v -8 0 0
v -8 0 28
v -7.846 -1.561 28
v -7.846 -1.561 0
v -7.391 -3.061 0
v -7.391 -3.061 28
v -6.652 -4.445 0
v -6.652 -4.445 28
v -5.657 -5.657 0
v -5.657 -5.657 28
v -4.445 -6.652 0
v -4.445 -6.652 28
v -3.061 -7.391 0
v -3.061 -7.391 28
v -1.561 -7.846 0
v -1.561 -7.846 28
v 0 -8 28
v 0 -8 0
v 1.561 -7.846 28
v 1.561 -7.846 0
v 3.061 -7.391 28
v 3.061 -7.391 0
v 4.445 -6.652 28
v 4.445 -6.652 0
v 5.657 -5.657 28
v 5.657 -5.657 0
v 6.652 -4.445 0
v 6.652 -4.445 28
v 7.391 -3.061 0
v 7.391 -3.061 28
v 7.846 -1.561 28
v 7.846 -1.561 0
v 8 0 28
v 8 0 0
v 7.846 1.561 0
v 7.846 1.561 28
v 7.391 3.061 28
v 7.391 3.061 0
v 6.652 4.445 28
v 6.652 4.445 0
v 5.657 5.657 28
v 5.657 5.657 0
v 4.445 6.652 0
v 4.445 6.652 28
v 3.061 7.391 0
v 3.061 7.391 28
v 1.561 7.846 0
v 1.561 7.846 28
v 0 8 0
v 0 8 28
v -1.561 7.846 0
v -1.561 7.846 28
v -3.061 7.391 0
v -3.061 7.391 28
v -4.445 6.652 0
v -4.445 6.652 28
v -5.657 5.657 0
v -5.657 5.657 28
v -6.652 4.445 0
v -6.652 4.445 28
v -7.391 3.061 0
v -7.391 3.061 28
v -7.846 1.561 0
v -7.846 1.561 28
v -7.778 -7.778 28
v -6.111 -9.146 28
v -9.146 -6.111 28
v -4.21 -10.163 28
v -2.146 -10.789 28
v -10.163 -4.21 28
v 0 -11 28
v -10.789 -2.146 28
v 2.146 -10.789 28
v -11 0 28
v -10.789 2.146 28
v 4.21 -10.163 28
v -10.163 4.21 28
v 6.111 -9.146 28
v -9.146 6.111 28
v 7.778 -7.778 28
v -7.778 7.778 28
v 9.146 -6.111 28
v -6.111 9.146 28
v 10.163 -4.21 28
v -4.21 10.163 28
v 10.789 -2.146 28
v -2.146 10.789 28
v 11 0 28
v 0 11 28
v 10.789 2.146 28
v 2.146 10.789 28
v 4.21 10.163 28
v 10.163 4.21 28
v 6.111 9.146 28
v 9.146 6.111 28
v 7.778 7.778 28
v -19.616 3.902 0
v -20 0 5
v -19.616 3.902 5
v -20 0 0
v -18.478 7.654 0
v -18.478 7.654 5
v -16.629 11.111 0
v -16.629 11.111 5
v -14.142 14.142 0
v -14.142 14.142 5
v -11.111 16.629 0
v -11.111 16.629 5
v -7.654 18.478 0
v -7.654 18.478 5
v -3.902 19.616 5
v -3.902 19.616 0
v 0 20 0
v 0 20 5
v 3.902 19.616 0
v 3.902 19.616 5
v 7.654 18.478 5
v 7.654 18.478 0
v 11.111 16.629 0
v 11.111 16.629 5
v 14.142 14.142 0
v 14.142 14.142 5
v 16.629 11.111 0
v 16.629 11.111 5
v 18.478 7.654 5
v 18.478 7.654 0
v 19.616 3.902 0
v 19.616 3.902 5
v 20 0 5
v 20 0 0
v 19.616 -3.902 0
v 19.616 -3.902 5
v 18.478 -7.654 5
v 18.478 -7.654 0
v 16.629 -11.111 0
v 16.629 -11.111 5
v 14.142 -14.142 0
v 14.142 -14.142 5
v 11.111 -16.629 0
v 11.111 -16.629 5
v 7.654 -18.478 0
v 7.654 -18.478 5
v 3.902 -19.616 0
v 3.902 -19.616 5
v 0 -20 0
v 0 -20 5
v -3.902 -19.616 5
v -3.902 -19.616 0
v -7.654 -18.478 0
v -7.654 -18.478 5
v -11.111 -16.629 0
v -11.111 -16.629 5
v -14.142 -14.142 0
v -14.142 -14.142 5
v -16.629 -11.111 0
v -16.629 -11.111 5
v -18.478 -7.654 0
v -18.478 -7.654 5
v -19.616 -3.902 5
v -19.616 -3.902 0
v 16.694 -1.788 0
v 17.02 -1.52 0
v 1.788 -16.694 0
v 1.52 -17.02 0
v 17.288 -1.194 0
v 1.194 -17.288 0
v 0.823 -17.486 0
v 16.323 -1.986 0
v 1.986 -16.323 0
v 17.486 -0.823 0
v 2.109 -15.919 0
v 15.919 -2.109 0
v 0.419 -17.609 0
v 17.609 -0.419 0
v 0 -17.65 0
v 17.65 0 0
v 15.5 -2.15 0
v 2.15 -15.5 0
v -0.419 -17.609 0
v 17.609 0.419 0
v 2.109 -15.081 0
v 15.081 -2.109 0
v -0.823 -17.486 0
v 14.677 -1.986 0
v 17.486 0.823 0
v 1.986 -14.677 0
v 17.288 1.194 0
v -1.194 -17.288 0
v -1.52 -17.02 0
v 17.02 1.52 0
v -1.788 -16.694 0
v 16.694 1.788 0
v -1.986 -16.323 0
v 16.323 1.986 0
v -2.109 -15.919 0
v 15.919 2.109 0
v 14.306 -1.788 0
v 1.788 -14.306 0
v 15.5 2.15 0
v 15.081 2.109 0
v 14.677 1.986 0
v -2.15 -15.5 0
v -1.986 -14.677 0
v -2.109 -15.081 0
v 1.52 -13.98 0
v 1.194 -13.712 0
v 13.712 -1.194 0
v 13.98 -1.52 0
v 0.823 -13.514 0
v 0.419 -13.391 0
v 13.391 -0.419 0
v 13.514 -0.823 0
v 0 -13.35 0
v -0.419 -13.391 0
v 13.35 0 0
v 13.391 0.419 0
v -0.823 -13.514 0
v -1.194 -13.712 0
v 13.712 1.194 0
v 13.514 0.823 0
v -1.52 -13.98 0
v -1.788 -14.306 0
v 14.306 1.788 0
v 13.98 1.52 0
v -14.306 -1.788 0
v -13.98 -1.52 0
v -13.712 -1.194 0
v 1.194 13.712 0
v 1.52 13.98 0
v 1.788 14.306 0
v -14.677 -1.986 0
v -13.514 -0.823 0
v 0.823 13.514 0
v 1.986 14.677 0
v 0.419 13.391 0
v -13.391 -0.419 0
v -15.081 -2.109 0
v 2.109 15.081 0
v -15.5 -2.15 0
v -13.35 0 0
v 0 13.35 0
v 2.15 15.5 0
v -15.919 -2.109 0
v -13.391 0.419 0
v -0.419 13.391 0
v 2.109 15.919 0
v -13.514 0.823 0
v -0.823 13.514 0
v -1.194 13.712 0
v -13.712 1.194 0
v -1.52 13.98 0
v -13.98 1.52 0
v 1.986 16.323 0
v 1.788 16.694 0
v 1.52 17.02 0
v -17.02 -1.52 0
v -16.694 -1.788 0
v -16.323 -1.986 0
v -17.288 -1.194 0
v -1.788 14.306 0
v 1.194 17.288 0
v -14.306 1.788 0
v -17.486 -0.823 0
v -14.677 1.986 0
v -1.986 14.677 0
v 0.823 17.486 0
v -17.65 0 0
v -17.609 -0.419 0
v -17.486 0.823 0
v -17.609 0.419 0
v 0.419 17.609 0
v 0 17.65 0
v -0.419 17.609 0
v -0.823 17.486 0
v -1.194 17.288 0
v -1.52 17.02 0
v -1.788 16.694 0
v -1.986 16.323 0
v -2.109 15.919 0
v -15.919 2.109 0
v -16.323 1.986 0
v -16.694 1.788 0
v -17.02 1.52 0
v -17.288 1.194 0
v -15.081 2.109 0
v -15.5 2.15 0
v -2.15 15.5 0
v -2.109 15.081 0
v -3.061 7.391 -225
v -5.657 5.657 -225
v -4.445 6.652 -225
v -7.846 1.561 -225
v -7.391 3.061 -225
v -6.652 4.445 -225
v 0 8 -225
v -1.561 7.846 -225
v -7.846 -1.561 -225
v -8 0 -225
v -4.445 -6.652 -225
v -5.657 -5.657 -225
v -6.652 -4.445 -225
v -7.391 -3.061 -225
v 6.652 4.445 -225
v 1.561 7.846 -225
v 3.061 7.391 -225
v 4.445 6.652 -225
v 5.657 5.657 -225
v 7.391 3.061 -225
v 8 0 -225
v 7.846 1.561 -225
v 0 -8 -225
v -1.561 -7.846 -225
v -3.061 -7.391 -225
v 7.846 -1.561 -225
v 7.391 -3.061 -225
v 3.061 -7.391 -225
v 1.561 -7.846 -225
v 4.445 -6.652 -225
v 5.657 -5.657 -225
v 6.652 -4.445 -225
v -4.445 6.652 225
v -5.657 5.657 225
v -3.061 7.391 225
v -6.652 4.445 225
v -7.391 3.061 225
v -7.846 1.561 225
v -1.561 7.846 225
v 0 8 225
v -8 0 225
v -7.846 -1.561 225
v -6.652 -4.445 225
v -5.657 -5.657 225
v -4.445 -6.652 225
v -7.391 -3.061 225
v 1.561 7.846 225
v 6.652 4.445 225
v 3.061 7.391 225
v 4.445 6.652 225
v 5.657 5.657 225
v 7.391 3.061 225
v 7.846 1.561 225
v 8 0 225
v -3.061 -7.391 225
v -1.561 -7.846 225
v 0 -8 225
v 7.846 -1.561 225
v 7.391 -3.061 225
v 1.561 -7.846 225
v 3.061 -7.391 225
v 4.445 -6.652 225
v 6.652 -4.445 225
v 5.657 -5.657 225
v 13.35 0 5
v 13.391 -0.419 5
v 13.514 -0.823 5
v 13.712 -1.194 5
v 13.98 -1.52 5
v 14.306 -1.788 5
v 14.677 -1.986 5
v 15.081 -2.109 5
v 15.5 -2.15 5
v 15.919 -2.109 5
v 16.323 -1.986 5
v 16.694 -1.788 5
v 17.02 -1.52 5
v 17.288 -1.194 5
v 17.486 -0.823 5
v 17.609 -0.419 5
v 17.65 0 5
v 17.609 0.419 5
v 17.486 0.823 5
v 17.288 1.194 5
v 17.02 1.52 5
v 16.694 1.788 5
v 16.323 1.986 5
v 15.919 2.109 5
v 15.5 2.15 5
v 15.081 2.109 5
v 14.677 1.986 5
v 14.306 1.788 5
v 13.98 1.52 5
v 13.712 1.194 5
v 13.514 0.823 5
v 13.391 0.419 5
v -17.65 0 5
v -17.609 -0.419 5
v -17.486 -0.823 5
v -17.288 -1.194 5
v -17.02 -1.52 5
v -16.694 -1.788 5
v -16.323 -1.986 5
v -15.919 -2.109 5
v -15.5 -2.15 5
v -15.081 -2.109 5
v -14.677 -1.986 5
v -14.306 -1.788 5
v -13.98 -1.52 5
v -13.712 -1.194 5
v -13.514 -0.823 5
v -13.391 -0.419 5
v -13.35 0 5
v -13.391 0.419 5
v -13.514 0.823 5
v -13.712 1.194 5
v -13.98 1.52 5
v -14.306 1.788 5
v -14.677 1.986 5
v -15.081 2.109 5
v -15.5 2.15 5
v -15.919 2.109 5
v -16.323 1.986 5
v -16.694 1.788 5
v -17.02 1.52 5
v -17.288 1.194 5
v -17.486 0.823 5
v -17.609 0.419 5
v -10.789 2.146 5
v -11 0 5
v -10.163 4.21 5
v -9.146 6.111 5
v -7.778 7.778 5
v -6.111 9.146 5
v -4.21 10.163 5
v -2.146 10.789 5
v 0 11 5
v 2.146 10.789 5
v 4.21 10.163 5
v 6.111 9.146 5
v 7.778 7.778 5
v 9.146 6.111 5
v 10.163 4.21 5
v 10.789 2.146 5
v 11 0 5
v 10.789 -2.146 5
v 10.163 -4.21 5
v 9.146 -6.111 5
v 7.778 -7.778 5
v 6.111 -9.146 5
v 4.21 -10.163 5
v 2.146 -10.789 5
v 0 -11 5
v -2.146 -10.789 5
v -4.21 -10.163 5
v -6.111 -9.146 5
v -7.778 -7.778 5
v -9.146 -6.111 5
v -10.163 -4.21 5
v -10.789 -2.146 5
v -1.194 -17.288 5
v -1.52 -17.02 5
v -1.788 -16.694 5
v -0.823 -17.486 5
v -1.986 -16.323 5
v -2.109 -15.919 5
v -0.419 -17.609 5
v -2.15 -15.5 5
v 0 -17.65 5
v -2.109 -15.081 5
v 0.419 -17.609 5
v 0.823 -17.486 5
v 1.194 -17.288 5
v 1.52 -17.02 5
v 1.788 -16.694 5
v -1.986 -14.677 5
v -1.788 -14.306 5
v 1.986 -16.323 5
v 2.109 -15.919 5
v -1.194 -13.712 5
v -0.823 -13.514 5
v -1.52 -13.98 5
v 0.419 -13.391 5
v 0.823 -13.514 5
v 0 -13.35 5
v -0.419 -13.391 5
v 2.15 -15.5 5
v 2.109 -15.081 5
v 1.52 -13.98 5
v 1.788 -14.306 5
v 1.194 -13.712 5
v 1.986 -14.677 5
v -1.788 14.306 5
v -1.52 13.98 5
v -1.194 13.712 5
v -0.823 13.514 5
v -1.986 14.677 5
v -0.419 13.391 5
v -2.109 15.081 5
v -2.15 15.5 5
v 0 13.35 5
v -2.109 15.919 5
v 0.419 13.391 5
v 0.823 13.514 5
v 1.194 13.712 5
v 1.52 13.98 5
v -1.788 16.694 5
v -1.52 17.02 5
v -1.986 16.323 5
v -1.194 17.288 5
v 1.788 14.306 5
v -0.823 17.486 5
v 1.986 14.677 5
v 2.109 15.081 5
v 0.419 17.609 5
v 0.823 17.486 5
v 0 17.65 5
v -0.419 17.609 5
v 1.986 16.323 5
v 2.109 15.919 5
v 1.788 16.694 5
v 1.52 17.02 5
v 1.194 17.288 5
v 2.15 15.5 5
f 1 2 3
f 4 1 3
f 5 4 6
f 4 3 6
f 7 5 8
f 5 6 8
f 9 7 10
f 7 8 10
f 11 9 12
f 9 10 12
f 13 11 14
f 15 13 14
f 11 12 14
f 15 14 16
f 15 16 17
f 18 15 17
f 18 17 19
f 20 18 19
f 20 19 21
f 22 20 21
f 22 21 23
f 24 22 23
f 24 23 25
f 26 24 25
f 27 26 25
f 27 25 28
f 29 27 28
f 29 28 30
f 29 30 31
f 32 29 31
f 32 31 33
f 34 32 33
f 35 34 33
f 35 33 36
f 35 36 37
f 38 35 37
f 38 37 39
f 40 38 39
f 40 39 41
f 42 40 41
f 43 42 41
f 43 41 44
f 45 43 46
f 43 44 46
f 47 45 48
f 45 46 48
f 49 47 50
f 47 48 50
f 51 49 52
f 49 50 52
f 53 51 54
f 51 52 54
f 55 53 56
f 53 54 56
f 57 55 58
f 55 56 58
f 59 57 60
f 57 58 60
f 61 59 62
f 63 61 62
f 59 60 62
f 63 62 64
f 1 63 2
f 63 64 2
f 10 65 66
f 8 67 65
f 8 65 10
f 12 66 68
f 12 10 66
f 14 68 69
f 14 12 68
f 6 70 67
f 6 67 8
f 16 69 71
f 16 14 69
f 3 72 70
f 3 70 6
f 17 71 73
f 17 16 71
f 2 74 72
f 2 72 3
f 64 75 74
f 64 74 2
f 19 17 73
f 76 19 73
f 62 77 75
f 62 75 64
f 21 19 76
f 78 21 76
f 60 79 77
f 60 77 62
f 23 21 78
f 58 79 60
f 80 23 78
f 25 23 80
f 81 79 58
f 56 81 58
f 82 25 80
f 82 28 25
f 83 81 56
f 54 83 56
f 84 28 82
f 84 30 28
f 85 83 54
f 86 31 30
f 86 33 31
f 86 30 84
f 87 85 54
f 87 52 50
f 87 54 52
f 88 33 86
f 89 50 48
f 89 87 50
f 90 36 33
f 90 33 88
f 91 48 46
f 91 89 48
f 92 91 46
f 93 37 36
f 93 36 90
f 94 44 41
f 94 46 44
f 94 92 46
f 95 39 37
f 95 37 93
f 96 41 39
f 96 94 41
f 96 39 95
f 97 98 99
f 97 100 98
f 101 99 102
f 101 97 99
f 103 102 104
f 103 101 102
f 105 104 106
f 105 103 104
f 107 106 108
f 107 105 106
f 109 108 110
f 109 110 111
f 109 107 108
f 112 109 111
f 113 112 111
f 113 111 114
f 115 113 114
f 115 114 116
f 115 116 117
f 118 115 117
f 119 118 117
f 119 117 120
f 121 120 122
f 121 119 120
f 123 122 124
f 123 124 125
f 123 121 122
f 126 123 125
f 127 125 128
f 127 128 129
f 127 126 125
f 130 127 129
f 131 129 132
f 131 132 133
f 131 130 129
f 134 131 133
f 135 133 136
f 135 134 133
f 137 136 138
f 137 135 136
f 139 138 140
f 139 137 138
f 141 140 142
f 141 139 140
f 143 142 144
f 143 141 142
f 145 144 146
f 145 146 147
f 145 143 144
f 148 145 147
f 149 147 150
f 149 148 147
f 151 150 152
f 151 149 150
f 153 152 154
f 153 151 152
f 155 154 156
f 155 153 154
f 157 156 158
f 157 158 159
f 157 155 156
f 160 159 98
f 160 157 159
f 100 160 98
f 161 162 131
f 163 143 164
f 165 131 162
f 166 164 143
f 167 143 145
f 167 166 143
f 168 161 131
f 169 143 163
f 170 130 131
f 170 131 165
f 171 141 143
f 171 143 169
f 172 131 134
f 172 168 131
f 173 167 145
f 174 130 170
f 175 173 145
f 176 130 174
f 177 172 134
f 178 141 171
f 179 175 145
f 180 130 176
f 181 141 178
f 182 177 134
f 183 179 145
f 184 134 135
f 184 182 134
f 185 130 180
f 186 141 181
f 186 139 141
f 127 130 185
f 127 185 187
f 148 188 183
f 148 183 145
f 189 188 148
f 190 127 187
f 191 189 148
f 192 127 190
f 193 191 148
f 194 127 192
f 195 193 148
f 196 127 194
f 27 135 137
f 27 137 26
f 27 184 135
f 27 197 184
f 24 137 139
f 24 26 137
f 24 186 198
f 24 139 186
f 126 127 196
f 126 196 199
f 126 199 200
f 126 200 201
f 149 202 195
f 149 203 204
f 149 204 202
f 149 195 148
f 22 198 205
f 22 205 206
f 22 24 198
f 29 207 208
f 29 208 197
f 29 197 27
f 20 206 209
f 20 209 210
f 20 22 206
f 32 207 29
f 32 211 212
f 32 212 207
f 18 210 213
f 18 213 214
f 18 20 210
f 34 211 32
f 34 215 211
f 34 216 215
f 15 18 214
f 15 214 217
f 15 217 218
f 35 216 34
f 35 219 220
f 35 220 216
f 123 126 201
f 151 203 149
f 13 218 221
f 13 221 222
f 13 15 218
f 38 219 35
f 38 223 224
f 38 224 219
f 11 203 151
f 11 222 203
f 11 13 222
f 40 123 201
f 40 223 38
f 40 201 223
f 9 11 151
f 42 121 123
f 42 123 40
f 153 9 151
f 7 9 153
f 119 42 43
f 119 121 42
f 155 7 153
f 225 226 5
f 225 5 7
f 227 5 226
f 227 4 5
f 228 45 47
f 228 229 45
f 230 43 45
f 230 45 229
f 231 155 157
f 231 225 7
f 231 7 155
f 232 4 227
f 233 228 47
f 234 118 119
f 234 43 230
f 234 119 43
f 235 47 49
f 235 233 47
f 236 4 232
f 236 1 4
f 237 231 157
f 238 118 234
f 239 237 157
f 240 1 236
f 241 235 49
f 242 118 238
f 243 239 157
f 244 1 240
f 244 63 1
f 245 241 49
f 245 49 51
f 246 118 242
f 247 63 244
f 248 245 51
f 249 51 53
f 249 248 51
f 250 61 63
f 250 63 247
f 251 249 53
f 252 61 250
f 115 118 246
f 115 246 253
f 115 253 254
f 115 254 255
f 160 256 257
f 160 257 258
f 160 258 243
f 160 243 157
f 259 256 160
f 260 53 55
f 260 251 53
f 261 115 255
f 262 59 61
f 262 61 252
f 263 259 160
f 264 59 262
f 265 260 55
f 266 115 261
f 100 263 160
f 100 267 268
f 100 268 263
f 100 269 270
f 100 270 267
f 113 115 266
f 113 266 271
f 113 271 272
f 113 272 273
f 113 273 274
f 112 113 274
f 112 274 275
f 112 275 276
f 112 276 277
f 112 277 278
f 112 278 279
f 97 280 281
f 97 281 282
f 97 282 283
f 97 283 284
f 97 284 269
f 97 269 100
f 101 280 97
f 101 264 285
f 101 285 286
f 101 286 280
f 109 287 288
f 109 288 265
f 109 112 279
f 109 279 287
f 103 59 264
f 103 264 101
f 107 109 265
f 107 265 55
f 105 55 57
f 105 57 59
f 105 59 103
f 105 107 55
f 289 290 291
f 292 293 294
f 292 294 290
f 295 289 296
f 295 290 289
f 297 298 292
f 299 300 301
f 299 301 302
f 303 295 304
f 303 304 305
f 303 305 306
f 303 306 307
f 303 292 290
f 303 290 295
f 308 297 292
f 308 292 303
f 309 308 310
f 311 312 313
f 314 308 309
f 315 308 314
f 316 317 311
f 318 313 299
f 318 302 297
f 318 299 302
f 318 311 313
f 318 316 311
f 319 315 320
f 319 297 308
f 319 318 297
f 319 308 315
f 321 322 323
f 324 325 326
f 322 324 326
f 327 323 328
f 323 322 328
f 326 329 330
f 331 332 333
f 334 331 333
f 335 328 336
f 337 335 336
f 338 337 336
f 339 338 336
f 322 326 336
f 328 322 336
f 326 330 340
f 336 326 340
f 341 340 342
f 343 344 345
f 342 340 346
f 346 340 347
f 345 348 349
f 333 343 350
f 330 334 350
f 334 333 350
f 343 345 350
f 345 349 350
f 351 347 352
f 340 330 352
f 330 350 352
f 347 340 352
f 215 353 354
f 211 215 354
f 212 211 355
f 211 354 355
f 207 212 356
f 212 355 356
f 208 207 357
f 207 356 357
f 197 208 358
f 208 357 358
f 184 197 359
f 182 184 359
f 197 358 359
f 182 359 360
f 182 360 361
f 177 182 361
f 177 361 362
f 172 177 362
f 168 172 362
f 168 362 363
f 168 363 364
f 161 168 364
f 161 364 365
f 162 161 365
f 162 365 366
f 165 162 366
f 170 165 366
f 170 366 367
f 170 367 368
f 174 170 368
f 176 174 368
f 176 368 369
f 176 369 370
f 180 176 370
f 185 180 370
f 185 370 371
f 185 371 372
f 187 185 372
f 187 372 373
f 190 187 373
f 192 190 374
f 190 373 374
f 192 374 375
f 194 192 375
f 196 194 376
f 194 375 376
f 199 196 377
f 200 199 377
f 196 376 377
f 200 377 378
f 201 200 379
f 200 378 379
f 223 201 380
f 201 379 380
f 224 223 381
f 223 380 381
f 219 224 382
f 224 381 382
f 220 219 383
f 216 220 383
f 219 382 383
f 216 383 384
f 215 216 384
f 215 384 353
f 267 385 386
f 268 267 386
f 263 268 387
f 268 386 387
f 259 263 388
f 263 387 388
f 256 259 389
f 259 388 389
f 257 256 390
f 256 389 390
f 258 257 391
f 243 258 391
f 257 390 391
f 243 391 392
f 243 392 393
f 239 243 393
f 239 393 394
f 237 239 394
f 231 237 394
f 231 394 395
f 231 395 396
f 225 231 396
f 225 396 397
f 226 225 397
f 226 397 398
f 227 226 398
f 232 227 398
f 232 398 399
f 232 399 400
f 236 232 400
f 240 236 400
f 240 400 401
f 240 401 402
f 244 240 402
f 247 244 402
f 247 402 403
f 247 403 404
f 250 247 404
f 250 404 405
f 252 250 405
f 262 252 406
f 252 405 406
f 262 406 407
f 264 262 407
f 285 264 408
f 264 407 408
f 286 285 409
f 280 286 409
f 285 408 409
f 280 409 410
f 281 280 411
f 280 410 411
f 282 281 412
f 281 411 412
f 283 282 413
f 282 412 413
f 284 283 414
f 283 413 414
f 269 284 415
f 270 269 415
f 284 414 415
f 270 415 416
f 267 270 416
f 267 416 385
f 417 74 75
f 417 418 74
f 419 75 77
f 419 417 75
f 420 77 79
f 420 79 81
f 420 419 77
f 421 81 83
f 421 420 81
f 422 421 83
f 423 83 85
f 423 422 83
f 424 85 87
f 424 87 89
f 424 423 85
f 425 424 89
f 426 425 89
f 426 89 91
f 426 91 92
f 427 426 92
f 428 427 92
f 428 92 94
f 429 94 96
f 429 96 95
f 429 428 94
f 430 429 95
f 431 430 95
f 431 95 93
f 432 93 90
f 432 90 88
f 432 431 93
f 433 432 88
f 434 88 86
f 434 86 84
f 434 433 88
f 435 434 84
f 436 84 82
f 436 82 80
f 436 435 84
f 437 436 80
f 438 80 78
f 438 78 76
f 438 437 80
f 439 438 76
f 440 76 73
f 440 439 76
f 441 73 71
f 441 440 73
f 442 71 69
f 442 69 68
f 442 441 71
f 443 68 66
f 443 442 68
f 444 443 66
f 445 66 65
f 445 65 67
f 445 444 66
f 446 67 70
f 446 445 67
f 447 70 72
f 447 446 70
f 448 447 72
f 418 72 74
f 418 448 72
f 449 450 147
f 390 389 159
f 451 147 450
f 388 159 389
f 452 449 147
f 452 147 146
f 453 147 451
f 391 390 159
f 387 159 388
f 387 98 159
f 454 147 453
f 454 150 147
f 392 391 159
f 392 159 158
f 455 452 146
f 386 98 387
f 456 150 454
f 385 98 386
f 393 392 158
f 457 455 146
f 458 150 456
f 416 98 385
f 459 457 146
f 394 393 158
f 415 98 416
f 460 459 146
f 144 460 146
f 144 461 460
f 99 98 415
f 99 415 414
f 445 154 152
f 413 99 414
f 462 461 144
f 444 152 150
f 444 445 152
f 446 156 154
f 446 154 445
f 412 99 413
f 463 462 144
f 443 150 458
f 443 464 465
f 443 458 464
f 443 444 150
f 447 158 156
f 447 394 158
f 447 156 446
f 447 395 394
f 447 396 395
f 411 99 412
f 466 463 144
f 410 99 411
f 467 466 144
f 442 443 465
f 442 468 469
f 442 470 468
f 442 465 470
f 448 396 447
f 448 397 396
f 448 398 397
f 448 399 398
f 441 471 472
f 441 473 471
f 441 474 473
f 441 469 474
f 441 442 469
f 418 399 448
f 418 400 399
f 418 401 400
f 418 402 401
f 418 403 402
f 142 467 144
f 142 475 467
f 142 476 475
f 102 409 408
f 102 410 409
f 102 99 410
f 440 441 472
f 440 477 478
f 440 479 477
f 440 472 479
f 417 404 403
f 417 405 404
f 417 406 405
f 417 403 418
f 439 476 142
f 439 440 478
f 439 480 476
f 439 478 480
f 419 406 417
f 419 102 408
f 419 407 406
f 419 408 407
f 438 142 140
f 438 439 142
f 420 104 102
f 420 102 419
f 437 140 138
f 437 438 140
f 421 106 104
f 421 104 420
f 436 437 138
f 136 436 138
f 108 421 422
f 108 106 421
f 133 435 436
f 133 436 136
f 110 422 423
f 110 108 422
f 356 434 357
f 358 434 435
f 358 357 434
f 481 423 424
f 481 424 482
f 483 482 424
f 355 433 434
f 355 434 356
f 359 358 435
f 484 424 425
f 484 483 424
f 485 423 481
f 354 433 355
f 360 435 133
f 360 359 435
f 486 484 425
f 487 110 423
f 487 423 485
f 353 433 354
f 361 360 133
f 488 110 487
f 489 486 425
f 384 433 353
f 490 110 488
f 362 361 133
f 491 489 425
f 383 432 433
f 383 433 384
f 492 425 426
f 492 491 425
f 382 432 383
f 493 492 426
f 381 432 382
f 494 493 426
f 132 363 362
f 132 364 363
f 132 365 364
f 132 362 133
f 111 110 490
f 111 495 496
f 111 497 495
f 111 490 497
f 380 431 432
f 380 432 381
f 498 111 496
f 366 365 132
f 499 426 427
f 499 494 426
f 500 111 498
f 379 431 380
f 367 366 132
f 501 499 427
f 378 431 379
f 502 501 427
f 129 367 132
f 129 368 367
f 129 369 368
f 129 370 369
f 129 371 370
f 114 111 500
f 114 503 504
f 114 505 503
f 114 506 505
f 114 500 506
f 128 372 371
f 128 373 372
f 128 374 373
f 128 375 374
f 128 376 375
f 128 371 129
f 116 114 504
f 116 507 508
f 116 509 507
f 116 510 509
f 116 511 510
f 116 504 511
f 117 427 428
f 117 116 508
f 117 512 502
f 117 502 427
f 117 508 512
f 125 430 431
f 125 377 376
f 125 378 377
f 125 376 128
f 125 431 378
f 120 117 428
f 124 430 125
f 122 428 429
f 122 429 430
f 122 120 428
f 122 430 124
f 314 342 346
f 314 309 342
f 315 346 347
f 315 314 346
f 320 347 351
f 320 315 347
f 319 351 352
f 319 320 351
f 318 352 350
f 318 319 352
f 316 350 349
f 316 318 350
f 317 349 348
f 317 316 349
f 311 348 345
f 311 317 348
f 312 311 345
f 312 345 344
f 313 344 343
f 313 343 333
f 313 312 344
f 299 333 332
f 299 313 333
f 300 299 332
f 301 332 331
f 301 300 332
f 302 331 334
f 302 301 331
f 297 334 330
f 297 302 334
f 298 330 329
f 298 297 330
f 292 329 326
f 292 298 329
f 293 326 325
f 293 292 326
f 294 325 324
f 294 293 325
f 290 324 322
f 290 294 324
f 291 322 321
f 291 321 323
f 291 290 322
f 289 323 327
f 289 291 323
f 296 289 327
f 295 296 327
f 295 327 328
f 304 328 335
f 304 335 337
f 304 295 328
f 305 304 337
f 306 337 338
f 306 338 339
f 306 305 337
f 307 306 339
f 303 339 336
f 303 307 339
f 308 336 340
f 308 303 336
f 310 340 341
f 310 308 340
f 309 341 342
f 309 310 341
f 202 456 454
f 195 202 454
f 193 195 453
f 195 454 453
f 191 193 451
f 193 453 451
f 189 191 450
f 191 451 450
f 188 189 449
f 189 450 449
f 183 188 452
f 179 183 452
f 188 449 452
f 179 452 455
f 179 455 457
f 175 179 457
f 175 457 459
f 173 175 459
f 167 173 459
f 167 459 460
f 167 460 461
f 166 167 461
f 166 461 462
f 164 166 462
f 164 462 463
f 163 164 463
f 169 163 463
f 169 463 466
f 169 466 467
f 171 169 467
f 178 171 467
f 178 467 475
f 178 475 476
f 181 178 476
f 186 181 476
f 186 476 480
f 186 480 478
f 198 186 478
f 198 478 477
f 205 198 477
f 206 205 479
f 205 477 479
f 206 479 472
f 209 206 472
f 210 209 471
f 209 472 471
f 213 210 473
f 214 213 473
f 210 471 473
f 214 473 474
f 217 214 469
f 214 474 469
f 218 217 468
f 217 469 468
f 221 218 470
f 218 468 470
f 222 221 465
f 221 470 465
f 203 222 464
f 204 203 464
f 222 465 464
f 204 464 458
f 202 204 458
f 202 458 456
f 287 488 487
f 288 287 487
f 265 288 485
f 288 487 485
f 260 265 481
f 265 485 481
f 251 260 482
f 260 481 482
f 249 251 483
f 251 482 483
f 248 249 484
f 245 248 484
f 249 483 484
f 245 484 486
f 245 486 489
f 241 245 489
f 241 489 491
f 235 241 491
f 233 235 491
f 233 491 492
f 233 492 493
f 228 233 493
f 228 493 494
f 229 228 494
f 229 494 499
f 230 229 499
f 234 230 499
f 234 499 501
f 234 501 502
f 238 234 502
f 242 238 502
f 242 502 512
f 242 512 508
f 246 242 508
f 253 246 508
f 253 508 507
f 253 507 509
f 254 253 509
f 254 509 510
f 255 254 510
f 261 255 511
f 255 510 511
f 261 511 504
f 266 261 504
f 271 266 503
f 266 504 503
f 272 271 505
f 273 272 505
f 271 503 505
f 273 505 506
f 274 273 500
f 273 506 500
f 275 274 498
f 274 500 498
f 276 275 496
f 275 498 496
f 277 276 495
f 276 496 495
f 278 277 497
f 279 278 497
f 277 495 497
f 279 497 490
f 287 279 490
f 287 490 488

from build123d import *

# Parameters (mm, degrees)
F3_D          = 16
F4_D          = 4.3
F5_R          = 8
F6_DEPTH      = 225
F6_DEPTH_BACK = 225


with BuildPart() as f1:
    # F0 (on Front) → F1 (revolve)
    with BuildSketch(Plane.XZ):
        Polygon((-20, 0), (0, 0), (0, 28), (-11, 28), (-11, 5), (-20, 5), align=None)
    revolve(axis=Axis((0, 0, 14), (0, 0, -1)))

    # F3 (through all)
    with Locations(Plane(origin=(0, 0, 0), x_dir=(1, 0, 0), z_dir=(0, 0, -1))):
        with Locations((0, 0)):
            Hole(F3_D / 2)

    # F4 (through all)
    with Locations(Plane(origin=(0, 0, 0), x_dir=(1, 0, 0), z_dir=(0, 0, -1))):
        with Locations((0, 15.5), (15.5, 0), (0, -15.5), (-15.5, 0)):
            Hole(F4_D / 2)


with BuildPart() as f6:
    # F5 (on face) → F6 (new body, two sides)
    with BuildSketch(Plane(origin=(0, 0, 0), x_dir=(1, 0, 0), z_dir=(0, 0, -1))) as f6_sk:
        Circle(F5_R)
    extrude(amount=F6_DEPTH)
    extrude(f6_sk.sketch, amount=-F6_DEPTH_BACK)


solid = Compound([f1.part, f6.part])
